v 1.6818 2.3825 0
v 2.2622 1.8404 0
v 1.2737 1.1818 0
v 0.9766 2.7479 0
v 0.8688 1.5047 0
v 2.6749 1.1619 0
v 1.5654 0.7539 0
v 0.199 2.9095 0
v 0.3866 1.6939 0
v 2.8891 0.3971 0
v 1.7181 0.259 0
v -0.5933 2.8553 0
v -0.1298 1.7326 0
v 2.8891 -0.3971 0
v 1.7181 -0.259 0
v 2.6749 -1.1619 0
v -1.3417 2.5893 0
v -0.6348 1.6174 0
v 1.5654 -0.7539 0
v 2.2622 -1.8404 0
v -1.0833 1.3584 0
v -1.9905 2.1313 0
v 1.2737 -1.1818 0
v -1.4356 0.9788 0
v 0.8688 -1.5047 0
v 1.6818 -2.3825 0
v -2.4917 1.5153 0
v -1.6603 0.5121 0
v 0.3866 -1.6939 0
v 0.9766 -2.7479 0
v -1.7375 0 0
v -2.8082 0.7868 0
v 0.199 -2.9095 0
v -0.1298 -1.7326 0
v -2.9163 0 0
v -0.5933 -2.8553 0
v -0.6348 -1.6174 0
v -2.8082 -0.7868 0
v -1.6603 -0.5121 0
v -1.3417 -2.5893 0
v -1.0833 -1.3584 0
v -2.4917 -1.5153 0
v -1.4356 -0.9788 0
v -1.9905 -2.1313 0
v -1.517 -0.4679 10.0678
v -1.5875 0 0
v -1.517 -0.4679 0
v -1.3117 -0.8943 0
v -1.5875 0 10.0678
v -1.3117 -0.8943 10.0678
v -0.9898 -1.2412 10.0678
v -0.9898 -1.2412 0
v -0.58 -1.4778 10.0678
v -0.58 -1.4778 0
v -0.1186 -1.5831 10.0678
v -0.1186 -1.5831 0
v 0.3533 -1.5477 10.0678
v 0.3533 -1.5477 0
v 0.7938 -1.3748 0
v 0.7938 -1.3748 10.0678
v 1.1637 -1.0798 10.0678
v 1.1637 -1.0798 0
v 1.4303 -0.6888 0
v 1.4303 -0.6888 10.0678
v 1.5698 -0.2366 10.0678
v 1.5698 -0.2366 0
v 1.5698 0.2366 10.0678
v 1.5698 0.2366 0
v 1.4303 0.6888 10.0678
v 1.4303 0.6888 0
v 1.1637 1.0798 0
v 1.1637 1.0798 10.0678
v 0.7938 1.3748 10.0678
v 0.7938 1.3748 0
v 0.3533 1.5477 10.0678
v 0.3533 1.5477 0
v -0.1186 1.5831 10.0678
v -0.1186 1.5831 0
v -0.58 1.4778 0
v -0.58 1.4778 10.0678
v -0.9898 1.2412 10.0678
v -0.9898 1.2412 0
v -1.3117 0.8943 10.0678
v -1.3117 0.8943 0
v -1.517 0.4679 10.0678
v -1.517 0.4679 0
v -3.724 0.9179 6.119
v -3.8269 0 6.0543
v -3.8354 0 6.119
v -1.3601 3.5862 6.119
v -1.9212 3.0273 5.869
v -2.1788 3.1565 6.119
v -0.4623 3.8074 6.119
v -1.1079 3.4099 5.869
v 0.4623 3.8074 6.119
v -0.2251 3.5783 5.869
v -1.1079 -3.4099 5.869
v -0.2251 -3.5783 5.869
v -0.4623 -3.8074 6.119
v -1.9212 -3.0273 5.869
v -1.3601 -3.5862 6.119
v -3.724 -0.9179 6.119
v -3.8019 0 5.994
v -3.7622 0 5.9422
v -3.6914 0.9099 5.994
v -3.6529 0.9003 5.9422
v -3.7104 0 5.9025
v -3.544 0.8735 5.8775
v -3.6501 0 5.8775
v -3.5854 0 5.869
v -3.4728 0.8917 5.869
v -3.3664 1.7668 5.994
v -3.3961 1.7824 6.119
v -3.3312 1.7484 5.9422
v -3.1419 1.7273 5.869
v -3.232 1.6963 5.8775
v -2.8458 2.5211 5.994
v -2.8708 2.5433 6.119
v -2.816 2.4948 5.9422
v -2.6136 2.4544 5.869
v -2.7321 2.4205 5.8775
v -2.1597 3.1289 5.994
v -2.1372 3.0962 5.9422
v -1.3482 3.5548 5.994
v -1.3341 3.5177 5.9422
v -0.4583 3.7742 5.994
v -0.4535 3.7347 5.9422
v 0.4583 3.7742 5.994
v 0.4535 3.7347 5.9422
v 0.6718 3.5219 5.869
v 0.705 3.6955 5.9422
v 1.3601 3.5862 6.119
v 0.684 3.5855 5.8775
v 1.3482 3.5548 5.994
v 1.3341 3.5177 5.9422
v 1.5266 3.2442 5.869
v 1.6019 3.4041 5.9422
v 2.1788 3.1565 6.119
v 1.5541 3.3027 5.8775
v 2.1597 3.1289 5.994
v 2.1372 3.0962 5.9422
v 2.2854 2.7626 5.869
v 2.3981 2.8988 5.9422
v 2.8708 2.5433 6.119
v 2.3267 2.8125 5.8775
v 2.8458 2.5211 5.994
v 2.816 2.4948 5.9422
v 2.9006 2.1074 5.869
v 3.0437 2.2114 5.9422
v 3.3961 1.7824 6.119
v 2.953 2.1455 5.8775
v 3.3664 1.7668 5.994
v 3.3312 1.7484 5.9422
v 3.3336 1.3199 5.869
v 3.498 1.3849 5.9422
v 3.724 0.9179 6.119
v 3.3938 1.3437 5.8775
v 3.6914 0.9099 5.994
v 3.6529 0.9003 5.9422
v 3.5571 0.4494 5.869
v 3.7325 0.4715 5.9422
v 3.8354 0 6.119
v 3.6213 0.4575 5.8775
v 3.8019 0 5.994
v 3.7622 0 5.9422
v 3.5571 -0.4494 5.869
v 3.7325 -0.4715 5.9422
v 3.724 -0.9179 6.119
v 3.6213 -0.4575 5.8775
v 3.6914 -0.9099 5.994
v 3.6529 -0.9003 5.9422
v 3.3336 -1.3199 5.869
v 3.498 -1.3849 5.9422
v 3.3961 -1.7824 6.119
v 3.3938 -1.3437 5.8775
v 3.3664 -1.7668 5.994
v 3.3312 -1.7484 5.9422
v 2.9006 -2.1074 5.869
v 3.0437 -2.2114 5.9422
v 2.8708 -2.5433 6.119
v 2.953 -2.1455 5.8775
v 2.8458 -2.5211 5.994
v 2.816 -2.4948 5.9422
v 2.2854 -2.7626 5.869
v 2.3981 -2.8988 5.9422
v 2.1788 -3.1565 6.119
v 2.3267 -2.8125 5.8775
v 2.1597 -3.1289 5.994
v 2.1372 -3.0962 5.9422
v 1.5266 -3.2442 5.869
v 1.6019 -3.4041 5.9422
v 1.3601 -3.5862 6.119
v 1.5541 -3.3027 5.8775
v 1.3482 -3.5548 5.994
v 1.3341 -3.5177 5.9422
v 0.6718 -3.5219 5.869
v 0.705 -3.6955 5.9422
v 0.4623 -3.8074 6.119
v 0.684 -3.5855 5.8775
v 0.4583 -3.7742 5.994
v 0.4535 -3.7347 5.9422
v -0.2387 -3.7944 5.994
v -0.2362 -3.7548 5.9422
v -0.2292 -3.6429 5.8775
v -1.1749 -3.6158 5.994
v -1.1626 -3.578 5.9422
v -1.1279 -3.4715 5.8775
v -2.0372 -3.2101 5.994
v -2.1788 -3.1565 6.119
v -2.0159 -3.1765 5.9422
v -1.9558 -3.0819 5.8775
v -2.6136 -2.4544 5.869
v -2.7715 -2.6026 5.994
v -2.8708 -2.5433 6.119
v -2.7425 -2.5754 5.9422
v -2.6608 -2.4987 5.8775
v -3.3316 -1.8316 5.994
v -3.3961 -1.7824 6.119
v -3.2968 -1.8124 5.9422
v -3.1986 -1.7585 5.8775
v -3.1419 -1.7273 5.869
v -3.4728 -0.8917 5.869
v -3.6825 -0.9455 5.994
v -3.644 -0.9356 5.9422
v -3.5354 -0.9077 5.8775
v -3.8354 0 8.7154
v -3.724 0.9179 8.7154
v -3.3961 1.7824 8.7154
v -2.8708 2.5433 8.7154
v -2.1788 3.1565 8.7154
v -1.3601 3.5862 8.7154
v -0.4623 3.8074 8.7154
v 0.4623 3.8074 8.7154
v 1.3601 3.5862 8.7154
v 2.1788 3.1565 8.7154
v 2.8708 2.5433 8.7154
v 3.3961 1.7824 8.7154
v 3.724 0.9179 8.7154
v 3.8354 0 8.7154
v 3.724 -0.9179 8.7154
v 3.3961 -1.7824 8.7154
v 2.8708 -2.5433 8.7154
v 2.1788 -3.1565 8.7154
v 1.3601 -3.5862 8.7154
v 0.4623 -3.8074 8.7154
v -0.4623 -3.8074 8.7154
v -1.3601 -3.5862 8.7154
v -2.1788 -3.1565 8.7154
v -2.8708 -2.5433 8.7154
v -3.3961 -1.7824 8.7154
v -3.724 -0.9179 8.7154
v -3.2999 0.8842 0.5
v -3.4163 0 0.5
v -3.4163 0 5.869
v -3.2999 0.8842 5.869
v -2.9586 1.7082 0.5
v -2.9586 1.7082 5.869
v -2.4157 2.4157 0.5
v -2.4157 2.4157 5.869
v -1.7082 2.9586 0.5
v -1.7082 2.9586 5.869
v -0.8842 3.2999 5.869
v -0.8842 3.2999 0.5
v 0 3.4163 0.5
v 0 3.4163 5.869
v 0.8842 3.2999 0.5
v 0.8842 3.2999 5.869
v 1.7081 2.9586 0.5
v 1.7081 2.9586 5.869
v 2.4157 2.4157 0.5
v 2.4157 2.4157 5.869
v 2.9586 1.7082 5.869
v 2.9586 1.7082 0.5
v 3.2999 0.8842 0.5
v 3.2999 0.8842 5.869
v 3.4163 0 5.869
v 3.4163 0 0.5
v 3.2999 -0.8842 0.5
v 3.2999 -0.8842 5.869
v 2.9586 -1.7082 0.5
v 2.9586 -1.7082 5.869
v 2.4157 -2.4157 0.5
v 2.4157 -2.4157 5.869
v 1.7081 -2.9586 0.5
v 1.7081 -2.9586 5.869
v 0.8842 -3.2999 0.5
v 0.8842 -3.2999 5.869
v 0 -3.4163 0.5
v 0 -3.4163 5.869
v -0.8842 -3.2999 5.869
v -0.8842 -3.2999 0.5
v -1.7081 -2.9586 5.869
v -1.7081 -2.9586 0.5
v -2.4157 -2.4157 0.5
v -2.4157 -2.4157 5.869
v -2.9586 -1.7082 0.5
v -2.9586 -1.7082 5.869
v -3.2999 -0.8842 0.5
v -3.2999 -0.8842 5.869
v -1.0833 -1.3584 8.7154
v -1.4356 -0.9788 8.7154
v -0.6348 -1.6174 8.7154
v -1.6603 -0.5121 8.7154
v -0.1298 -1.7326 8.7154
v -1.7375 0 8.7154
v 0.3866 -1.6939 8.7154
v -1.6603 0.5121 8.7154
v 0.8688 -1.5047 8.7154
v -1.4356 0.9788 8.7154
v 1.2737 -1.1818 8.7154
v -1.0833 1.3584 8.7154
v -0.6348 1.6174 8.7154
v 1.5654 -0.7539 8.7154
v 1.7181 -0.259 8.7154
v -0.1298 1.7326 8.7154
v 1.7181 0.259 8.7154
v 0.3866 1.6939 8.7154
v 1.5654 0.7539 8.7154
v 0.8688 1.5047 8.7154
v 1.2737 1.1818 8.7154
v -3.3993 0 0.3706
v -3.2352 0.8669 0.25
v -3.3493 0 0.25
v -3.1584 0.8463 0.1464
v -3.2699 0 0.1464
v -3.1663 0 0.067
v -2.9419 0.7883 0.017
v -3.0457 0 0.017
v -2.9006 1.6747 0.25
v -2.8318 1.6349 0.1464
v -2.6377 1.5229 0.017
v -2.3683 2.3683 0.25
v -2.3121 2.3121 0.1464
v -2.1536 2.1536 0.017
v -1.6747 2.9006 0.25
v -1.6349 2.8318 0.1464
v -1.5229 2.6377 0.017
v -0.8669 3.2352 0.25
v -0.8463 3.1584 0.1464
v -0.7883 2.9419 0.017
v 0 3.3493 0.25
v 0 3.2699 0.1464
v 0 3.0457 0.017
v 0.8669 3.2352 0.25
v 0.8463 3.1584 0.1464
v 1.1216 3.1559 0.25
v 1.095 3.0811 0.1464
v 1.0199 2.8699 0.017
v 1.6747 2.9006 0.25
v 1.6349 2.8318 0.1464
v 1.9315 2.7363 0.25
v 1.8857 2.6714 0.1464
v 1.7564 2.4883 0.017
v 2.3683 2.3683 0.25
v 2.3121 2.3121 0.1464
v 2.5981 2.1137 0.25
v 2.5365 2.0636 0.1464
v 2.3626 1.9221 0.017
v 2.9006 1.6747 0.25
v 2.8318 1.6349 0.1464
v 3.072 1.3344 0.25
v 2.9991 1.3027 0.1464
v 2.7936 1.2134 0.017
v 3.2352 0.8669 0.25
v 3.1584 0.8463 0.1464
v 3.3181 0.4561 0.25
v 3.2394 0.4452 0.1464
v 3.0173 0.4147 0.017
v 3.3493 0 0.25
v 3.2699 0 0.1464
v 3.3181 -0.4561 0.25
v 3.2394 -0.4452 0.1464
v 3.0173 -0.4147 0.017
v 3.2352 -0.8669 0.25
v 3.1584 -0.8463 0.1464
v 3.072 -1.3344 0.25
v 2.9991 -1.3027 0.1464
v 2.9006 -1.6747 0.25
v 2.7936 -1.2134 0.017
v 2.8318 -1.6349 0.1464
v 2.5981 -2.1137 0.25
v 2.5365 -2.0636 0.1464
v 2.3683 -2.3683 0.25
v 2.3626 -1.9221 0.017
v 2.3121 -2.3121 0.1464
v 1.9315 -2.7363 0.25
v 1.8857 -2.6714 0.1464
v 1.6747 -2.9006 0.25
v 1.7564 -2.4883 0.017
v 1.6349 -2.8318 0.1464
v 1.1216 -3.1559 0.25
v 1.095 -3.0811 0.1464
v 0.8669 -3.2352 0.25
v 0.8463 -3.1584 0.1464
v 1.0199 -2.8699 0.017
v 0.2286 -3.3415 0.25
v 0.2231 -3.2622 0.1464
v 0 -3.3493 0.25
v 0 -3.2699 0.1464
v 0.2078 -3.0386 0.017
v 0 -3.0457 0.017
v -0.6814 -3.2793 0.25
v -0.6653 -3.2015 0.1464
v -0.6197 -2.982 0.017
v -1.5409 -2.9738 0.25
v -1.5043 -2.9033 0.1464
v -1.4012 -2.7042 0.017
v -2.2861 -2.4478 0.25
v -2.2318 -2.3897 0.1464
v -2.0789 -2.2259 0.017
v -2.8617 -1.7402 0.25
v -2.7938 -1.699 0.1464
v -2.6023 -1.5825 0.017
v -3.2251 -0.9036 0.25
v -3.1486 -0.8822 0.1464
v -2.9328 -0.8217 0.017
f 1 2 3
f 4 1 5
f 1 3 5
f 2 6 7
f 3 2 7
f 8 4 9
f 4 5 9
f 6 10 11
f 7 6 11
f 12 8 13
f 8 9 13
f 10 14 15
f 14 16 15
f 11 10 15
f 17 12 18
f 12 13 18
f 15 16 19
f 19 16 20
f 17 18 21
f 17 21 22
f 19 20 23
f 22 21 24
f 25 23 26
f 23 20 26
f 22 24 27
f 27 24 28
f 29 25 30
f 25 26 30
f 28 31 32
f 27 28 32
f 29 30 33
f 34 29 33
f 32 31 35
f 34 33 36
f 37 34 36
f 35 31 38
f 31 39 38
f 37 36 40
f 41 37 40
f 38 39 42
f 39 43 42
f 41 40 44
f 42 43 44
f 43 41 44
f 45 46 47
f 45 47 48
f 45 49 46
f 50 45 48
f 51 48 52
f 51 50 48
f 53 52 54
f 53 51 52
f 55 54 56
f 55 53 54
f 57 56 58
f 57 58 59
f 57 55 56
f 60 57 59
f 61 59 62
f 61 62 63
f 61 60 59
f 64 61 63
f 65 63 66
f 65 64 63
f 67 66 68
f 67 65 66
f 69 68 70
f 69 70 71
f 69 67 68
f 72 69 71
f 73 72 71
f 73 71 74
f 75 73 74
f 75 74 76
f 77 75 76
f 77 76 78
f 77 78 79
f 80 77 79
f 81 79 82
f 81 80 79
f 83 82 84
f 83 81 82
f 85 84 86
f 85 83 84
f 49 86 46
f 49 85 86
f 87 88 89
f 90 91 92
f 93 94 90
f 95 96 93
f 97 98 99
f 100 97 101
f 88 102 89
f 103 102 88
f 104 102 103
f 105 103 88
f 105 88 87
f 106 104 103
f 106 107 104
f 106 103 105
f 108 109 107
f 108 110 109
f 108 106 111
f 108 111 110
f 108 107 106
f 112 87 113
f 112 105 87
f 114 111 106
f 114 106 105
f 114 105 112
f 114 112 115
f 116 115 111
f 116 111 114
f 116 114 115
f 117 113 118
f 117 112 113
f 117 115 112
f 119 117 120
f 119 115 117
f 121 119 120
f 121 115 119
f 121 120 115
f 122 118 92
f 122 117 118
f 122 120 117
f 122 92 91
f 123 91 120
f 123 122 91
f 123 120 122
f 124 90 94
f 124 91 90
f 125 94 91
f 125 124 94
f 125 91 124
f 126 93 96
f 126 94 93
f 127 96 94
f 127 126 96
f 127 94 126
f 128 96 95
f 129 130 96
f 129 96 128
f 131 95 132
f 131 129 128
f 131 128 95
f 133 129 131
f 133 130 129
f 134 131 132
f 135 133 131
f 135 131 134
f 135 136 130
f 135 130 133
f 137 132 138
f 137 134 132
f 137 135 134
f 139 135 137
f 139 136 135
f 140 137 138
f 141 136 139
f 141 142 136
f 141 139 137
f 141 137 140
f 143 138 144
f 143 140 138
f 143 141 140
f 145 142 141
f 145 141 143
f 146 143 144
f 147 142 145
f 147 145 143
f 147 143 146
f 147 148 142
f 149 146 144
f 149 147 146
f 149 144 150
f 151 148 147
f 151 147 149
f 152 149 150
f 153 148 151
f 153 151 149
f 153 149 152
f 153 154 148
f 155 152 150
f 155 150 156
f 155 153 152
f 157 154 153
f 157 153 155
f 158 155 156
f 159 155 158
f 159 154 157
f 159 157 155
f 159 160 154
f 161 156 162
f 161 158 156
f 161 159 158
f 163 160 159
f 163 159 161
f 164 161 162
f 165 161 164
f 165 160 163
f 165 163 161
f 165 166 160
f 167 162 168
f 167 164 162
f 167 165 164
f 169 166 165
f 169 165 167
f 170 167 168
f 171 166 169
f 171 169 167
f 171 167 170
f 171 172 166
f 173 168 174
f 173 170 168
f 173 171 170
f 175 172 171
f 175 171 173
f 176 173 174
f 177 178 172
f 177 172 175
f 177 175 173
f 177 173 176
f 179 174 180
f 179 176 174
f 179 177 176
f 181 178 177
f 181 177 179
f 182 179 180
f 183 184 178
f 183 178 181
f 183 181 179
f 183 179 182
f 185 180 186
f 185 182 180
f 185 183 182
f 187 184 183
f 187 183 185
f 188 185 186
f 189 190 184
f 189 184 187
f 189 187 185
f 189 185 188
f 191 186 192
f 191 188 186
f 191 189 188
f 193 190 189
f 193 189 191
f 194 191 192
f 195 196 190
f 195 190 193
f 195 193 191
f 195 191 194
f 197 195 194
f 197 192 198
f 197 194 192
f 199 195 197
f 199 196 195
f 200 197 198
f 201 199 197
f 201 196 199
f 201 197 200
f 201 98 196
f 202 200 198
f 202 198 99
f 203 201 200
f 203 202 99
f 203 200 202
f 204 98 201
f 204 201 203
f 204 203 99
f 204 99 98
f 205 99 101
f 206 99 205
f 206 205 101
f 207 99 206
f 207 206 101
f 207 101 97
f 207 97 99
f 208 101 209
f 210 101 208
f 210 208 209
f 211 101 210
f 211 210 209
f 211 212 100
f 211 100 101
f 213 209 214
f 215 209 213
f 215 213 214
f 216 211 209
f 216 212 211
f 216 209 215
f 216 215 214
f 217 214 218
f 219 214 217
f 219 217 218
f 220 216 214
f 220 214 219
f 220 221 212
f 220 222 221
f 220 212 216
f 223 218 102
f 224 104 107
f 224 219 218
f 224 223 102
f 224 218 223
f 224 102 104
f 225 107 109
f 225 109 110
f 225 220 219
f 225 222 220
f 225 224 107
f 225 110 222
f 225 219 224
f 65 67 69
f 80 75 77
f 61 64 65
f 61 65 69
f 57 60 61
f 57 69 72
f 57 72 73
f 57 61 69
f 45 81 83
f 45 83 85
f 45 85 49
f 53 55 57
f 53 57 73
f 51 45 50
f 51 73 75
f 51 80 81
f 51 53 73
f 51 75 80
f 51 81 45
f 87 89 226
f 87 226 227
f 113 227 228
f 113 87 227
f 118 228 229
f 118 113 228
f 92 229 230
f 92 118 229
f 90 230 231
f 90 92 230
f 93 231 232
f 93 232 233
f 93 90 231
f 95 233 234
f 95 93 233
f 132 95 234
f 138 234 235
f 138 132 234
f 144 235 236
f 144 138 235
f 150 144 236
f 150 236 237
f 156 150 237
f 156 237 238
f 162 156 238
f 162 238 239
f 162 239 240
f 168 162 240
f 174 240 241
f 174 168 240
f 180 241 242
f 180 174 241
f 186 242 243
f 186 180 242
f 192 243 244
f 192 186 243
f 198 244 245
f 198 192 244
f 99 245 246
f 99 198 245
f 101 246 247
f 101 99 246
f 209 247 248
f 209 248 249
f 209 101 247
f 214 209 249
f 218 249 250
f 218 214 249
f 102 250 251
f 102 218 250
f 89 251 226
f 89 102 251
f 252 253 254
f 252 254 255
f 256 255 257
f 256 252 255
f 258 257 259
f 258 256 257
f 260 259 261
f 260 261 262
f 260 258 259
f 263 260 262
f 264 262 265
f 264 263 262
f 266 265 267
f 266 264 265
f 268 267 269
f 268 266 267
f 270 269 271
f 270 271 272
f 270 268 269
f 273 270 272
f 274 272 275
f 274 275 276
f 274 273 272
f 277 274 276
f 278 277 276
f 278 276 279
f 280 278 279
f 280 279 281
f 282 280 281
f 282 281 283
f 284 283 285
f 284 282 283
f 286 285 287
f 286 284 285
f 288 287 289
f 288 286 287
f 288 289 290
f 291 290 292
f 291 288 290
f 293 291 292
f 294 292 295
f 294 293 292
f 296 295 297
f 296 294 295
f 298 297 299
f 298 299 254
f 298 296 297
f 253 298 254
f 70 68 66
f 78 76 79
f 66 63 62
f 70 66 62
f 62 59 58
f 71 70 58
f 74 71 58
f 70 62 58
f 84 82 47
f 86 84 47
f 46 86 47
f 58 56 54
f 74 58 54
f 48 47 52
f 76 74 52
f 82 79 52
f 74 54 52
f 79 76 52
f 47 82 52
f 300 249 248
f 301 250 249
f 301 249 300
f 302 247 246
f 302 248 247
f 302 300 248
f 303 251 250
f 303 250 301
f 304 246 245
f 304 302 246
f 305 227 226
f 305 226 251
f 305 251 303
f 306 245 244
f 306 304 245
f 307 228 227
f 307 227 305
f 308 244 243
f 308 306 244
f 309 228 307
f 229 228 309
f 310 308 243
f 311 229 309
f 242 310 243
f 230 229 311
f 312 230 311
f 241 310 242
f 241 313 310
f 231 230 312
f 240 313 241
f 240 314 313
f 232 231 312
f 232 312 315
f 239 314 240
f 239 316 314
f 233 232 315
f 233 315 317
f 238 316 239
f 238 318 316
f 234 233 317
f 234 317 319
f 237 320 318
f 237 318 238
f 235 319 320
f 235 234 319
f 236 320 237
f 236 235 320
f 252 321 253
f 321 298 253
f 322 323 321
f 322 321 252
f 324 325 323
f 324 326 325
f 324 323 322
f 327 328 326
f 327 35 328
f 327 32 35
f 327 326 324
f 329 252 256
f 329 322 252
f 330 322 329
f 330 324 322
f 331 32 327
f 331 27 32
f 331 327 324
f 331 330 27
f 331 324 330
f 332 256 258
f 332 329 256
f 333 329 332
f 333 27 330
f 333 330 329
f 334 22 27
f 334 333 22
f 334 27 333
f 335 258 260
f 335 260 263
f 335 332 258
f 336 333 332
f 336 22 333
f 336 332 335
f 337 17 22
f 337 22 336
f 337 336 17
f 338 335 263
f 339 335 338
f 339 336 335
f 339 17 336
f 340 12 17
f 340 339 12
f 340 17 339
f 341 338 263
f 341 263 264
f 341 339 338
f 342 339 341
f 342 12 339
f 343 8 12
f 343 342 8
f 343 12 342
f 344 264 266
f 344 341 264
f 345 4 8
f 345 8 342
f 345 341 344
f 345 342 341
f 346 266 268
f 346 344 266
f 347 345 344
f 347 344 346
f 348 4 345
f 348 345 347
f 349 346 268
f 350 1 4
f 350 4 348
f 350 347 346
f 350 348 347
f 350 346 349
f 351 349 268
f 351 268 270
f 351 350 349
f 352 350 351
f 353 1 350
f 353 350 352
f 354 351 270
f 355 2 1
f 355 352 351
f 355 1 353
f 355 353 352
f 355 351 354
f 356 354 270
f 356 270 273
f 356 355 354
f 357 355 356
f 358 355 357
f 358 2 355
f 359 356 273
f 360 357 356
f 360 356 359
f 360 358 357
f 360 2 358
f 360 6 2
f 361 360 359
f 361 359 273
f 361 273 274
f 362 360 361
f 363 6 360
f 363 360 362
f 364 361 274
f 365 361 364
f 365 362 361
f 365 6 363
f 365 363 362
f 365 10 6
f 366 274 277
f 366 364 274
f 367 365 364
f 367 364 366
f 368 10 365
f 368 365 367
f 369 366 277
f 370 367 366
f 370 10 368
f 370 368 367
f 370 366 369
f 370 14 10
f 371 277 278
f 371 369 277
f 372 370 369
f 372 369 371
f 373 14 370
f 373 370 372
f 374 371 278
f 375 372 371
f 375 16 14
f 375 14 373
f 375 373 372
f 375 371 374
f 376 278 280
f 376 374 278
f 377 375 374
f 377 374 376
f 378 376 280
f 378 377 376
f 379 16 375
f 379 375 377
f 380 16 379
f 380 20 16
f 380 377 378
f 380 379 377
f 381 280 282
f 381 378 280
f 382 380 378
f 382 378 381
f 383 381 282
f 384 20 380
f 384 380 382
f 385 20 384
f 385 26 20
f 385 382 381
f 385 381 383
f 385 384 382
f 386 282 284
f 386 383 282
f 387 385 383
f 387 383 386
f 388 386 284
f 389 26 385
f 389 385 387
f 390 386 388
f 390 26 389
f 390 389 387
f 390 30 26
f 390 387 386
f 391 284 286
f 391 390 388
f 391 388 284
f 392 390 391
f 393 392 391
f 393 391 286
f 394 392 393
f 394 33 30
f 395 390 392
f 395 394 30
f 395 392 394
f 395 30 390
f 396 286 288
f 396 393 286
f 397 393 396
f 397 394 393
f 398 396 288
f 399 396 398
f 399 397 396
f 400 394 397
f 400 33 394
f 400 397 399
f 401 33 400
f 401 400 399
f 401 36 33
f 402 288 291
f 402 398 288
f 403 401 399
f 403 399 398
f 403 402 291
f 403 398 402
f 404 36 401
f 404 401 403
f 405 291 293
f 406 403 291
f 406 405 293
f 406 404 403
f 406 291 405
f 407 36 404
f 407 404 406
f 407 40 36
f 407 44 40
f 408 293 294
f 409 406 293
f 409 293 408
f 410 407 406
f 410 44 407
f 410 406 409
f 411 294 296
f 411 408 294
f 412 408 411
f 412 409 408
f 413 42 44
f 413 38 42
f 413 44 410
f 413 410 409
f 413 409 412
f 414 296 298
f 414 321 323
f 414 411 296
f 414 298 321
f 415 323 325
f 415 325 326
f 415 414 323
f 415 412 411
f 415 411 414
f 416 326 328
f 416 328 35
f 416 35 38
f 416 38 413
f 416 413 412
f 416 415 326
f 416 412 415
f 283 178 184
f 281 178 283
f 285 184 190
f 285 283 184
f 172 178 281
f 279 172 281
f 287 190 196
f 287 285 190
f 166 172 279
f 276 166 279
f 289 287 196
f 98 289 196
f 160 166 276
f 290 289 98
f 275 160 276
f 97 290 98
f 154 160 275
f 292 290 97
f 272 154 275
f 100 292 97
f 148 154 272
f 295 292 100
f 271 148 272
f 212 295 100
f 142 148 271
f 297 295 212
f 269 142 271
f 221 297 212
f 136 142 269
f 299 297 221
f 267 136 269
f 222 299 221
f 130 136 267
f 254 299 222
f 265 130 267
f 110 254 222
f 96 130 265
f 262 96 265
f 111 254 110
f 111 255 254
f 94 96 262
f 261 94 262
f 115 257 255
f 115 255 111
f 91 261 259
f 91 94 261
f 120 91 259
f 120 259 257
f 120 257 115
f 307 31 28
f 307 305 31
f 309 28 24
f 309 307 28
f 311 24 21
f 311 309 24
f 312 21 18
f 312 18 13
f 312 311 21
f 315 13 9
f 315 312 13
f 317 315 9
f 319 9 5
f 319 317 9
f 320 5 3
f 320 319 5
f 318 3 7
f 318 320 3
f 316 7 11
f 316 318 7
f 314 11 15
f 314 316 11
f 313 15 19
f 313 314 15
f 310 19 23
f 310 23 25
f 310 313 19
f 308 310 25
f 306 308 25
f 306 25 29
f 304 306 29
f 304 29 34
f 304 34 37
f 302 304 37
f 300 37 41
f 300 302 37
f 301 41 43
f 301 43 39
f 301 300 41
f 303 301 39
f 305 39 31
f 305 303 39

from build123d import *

# Parameters (mm, degrees)
F2_R     = 0.25
F3_R     = 0.5
F4_W     = 1.5875
F4_H     = 10.0678
F6_DEPTH = 2


with BuildPart() as f1:
    # F0 (on Front) → F1 (revolve)
    with BuildSketch(Plane.XZ):
        Polygon((-3.4163, 0), (0, 0), (0, 2), (-1.7375, 2), (-1.7375, 8.7154), (-3.8354, 8.7154), (-3.8354, 5.869), (-3.4163, 5.869), align=None)
    revolve(axis=Axis((0, 0, 1), (0, 0, -1)))

    # F2
    f2_edges = [f1.edges().sort_by_distance(p)[0] for p in [
        (3.8354, 0, 5.869),
    ]]
    fillet(f2_edges, radius=F2_R)

    # F3
    f3_edges = [f1.edges().sort_by_distance(p)[0] for p in [
        (3.4163, 0, 0),
    ]]
    fillet(f3_edges, radius=F3_R)

    # F4 (on Front) → F5 (revolve)
    with BuildSketch(Plane.XZ):
        with Locations((-0.79375, 5.0339)):
            Rectangle(F4_W, F4_H)
    revolve(axis=Axis((0, 0, 5.0339), (0, 0, 1)))

    # F6 (cut, through all): a face of the model
    f6_faces = [f1.faces().sort_by_distance(p)[0] for p in [
        (1.6883560787, 0, 2),
    ]]
    extrude(f6_faces, amount=-F6_DEPTH, mode=Mode.SUBTRACT)


solid = f1.part
